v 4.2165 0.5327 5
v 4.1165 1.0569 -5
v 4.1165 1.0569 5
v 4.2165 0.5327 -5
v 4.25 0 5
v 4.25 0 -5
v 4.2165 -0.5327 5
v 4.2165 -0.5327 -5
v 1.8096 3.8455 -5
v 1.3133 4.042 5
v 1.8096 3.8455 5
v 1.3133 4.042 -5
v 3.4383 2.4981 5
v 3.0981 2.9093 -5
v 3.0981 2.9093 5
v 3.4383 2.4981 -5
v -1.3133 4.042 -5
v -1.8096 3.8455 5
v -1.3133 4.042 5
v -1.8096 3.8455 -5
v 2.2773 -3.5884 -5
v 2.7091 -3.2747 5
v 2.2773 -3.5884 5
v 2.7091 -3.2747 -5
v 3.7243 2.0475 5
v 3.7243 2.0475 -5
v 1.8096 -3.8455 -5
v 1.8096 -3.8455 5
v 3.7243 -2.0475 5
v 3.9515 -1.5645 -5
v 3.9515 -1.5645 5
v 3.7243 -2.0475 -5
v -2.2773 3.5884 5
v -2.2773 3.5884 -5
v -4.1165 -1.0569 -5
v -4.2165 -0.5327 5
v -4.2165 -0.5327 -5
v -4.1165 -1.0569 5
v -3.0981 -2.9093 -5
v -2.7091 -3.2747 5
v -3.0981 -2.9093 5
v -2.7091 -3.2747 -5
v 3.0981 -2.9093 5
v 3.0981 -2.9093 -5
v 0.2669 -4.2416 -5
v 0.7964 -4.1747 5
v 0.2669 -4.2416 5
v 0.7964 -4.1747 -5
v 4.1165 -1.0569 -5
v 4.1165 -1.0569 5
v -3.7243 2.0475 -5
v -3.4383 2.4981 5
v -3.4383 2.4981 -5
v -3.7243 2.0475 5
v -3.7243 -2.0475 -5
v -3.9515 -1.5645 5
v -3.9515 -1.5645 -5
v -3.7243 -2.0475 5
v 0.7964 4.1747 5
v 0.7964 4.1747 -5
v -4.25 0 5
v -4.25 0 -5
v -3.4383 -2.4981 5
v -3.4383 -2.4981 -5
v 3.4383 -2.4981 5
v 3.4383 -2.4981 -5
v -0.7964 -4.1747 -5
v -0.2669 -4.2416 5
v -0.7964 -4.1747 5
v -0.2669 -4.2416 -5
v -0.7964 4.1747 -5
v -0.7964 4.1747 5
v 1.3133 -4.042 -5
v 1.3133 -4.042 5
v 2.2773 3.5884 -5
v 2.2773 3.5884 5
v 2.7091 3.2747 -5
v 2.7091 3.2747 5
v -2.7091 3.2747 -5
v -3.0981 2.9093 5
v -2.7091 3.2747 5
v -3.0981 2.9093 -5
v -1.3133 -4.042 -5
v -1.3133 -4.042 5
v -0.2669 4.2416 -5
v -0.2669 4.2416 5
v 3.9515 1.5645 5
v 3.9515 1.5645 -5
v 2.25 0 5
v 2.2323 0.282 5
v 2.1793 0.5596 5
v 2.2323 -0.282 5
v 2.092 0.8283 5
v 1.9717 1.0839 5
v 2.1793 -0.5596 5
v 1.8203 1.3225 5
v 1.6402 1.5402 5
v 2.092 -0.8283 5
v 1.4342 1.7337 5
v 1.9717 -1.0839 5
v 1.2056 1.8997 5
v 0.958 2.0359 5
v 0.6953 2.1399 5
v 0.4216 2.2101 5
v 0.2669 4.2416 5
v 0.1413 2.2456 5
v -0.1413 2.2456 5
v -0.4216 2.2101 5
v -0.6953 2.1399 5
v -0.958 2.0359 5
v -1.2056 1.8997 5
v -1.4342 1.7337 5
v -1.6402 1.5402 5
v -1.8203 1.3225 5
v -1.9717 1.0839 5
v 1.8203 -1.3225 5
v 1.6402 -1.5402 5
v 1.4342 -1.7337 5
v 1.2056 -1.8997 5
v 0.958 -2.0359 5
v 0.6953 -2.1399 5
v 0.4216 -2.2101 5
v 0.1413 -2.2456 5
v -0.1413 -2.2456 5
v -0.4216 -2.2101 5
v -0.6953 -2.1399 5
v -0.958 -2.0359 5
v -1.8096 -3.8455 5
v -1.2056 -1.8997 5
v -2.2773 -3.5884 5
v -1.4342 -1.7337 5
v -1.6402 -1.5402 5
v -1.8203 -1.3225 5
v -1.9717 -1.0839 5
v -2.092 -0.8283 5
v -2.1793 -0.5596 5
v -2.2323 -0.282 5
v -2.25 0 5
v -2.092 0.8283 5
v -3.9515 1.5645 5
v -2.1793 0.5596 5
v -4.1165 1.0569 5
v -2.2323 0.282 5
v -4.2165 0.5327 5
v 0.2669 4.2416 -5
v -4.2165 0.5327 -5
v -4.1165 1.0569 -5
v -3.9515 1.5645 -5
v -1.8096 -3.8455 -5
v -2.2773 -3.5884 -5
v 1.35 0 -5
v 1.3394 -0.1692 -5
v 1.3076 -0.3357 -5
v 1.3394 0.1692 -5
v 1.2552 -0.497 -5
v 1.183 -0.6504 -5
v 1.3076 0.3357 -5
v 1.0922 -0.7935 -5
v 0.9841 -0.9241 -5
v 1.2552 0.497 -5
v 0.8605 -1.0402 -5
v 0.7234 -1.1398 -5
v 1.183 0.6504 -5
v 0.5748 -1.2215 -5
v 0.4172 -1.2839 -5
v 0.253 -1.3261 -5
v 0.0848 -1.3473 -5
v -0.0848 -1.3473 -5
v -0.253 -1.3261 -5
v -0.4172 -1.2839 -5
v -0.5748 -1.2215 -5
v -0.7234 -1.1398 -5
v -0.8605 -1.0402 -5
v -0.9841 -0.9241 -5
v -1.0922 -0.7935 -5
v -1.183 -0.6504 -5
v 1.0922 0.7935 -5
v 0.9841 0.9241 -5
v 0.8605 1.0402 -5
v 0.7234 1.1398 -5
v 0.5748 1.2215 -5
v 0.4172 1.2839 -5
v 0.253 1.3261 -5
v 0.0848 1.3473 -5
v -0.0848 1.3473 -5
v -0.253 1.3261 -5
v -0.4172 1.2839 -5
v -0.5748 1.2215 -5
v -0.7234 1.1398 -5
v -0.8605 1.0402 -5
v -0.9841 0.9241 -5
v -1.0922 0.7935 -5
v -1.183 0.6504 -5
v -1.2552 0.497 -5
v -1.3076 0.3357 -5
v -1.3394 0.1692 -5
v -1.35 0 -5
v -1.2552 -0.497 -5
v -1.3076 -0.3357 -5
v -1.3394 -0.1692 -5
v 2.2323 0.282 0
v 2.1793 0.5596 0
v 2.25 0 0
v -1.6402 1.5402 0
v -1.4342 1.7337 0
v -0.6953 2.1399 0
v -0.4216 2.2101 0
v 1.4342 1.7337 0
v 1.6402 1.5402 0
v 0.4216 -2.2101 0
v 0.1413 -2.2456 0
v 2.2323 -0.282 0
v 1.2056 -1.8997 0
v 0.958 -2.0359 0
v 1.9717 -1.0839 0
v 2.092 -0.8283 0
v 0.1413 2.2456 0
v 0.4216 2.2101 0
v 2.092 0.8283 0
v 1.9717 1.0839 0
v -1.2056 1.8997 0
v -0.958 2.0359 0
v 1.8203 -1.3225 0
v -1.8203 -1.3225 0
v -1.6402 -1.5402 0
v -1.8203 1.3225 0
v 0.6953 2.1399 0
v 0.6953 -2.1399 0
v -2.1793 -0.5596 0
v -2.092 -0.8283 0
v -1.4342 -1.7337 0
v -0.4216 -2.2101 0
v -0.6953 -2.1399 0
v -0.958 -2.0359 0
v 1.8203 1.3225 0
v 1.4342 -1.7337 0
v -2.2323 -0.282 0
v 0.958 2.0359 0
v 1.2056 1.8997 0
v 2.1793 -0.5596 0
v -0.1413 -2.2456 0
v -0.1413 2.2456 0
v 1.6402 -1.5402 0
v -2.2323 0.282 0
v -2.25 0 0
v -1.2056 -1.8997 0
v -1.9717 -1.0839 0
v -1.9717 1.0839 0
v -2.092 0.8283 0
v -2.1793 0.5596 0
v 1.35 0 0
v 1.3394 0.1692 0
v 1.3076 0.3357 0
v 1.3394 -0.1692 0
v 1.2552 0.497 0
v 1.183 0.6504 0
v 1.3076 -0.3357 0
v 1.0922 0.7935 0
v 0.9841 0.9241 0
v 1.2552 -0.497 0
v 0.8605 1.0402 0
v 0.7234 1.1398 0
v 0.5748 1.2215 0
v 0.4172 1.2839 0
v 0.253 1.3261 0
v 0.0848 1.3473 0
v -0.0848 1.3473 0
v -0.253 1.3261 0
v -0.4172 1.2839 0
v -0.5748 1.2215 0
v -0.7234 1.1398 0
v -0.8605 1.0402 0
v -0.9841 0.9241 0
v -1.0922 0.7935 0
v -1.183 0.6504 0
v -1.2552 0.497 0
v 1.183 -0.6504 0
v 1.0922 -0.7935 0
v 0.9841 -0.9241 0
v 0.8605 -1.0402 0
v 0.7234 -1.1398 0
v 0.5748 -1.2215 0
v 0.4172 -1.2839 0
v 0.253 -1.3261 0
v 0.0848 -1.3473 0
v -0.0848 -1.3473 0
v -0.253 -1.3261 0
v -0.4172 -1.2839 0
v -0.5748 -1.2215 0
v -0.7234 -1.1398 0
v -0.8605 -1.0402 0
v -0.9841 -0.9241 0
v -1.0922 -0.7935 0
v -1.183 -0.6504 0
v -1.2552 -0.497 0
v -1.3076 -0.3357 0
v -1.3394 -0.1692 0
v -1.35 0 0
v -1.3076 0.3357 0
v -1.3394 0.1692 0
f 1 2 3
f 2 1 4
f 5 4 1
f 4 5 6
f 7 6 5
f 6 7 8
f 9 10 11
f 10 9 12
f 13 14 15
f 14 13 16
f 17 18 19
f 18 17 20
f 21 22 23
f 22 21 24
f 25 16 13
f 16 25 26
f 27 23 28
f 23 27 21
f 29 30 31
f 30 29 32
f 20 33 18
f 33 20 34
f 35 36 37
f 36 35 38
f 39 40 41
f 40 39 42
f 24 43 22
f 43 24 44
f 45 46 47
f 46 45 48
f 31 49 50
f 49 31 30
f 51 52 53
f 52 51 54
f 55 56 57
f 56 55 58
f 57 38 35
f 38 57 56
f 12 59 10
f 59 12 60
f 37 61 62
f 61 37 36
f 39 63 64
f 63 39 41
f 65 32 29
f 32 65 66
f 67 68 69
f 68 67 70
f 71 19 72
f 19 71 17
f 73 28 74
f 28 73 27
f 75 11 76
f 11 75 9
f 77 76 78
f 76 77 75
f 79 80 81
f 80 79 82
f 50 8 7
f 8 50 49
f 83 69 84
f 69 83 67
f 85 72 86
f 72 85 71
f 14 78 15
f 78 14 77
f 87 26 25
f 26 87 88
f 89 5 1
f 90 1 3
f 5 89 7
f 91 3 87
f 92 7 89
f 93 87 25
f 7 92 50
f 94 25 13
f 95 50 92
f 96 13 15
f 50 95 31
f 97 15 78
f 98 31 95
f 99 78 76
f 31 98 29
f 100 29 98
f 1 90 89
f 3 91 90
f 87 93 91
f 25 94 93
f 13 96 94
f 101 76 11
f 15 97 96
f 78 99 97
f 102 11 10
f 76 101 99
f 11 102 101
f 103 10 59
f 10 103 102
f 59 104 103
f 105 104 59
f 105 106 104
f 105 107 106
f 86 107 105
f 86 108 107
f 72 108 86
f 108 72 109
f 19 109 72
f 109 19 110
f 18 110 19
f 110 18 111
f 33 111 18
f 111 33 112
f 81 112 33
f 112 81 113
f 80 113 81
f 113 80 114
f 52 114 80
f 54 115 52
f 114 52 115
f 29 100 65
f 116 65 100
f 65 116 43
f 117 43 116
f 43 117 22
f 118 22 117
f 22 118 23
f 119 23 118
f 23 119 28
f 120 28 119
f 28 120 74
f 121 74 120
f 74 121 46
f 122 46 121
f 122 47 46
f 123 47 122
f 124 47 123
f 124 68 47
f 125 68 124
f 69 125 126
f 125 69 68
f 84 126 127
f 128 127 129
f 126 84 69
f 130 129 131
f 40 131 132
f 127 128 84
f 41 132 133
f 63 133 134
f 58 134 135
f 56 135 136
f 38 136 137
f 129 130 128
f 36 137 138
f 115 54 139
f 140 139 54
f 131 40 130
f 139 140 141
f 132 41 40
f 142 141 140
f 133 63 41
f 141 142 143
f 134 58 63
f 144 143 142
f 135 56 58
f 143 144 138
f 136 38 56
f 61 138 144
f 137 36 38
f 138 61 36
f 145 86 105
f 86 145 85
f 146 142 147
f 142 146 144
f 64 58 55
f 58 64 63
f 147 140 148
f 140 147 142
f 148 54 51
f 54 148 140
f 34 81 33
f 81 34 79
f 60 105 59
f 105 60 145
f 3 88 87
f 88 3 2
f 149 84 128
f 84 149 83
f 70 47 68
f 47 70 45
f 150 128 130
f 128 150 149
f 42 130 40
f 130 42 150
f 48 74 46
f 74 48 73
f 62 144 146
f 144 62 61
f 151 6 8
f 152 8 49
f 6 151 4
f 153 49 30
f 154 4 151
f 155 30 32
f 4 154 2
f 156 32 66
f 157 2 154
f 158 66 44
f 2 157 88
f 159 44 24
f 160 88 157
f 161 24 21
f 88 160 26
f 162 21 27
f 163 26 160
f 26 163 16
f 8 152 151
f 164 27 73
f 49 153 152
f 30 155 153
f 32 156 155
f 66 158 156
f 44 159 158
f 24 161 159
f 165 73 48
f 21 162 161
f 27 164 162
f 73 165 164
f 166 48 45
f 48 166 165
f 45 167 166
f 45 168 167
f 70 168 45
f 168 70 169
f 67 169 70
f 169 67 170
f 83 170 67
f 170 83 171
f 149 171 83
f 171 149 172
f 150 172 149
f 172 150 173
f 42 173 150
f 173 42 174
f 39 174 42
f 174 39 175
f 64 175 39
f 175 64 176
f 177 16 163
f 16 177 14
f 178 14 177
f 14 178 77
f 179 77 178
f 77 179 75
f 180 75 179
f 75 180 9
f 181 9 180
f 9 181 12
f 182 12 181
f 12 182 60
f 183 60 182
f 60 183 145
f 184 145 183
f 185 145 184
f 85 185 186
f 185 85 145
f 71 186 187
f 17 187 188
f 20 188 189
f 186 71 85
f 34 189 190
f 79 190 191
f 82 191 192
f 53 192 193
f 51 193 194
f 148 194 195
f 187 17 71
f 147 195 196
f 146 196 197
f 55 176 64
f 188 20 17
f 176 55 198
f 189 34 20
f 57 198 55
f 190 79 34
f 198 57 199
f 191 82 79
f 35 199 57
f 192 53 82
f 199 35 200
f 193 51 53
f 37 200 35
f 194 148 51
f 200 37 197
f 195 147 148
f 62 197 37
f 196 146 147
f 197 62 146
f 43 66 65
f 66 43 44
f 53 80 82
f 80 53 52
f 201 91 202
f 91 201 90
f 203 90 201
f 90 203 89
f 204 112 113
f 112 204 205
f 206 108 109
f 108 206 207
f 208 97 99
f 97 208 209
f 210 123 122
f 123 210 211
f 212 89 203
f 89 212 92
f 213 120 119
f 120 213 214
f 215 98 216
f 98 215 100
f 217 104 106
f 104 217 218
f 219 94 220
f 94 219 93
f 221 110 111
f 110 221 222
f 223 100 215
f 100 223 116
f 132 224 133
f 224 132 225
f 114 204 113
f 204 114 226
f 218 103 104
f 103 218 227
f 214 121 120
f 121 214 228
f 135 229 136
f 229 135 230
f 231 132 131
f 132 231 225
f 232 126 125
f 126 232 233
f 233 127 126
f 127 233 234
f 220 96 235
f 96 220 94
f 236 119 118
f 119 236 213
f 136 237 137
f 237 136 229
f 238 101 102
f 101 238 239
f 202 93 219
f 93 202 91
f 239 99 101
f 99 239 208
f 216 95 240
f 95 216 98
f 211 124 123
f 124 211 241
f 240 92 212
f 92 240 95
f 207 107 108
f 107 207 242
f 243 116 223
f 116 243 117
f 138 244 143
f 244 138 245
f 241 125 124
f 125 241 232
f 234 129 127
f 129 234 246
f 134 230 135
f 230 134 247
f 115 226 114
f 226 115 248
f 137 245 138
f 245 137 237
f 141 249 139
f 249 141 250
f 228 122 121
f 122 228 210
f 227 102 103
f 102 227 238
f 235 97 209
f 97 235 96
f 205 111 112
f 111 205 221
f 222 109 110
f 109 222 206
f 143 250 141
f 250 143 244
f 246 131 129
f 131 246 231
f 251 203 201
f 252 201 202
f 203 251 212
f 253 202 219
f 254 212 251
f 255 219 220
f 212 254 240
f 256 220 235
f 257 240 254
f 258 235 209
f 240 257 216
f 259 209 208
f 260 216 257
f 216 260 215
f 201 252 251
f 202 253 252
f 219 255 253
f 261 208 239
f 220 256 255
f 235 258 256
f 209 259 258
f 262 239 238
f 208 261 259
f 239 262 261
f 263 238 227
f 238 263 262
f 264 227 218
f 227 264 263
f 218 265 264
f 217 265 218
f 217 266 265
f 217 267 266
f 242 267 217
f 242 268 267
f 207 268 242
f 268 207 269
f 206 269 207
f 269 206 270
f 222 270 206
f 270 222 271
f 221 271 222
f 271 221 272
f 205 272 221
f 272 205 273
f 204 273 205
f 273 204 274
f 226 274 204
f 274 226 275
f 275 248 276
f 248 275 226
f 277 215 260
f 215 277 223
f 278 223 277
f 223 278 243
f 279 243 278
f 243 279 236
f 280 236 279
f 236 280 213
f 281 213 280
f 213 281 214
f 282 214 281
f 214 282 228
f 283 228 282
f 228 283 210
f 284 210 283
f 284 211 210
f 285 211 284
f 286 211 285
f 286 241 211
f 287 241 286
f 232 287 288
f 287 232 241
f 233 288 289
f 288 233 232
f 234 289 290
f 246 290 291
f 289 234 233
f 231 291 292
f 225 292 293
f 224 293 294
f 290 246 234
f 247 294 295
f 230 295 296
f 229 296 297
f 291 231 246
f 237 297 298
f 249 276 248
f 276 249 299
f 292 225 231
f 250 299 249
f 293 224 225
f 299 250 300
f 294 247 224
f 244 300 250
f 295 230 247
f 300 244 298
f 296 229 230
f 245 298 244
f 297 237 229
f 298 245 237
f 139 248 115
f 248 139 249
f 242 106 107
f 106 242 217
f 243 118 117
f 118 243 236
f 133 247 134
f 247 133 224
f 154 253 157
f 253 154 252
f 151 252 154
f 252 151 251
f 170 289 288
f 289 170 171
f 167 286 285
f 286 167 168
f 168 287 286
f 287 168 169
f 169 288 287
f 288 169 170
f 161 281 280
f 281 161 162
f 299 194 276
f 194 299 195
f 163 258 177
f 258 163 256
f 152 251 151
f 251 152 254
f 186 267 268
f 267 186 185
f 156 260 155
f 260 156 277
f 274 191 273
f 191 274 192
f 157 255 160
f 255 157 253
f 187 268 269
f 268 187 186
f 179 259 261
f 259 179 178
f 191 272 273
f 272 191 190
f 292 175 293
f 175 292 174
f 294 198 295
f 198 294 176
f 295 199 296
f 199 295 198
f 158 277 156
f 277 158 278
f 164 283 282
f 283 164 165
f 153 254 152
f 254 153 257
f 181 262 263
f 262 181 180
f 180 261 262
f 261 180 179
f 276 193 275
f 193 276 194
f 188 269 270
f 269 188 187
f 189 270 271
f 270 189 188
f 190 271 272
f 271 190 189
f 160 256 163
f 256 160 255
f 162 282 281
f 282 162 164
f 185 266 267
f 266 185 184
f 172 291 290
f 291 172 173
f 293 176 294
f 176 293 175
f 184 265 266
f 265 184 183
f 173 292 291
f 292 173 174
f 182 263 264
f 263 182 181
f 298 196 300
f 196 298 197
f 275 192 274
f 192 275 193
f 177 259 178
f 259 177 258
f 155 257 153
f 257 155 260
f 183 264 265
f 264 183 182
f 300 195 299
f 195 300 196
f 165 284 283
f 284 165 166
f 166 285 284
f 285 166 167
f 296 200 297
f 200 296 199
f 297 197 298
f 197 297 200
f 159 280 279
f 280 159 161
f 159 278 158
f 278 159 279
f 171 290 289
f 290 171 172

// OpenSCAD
difference (){
    $fn = 50; {
    cylinder (10,4.25,4.25, center=true);
translate (0,0,4.4)
cylinder (10,2.25,2.25);
 translate ([0,0,-6.4])
cylinder (10,1.35,1.35);       
}}
